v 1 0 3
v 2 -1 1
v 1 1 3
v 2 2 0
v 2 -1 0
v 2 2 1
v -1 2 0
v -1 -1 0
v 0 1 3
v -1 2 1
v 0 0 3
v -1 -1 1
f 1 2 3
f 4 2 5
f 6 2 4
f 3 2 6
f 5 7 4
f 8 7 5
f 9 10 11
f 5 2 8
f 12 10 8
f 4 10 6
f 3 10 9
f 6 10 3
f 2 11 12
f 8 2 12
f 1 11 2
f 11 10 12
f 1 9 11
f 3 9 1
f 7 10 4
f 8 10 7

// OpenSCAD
// The last four points aren't used by any face, so the result should be the same
// as without them: a pyramid with its corners rounded by the cube, not a box.
minkowski() {
  cube(1);
  polyhedron(
    points=[[1, 1, 0], [-1, 1, 0], [-1, -1, 0], [1, -1, 0], [0, 0, 2],
            [1, 1, 2], [-1, 1, 2], [-1, -1, 2], [1, -1, 2]],
    faces=[[0, 1, 2, 3], [0, 4, 1], [1, 4, 2], [2, 4, 3], [3, 4, 0]]
  );
}
